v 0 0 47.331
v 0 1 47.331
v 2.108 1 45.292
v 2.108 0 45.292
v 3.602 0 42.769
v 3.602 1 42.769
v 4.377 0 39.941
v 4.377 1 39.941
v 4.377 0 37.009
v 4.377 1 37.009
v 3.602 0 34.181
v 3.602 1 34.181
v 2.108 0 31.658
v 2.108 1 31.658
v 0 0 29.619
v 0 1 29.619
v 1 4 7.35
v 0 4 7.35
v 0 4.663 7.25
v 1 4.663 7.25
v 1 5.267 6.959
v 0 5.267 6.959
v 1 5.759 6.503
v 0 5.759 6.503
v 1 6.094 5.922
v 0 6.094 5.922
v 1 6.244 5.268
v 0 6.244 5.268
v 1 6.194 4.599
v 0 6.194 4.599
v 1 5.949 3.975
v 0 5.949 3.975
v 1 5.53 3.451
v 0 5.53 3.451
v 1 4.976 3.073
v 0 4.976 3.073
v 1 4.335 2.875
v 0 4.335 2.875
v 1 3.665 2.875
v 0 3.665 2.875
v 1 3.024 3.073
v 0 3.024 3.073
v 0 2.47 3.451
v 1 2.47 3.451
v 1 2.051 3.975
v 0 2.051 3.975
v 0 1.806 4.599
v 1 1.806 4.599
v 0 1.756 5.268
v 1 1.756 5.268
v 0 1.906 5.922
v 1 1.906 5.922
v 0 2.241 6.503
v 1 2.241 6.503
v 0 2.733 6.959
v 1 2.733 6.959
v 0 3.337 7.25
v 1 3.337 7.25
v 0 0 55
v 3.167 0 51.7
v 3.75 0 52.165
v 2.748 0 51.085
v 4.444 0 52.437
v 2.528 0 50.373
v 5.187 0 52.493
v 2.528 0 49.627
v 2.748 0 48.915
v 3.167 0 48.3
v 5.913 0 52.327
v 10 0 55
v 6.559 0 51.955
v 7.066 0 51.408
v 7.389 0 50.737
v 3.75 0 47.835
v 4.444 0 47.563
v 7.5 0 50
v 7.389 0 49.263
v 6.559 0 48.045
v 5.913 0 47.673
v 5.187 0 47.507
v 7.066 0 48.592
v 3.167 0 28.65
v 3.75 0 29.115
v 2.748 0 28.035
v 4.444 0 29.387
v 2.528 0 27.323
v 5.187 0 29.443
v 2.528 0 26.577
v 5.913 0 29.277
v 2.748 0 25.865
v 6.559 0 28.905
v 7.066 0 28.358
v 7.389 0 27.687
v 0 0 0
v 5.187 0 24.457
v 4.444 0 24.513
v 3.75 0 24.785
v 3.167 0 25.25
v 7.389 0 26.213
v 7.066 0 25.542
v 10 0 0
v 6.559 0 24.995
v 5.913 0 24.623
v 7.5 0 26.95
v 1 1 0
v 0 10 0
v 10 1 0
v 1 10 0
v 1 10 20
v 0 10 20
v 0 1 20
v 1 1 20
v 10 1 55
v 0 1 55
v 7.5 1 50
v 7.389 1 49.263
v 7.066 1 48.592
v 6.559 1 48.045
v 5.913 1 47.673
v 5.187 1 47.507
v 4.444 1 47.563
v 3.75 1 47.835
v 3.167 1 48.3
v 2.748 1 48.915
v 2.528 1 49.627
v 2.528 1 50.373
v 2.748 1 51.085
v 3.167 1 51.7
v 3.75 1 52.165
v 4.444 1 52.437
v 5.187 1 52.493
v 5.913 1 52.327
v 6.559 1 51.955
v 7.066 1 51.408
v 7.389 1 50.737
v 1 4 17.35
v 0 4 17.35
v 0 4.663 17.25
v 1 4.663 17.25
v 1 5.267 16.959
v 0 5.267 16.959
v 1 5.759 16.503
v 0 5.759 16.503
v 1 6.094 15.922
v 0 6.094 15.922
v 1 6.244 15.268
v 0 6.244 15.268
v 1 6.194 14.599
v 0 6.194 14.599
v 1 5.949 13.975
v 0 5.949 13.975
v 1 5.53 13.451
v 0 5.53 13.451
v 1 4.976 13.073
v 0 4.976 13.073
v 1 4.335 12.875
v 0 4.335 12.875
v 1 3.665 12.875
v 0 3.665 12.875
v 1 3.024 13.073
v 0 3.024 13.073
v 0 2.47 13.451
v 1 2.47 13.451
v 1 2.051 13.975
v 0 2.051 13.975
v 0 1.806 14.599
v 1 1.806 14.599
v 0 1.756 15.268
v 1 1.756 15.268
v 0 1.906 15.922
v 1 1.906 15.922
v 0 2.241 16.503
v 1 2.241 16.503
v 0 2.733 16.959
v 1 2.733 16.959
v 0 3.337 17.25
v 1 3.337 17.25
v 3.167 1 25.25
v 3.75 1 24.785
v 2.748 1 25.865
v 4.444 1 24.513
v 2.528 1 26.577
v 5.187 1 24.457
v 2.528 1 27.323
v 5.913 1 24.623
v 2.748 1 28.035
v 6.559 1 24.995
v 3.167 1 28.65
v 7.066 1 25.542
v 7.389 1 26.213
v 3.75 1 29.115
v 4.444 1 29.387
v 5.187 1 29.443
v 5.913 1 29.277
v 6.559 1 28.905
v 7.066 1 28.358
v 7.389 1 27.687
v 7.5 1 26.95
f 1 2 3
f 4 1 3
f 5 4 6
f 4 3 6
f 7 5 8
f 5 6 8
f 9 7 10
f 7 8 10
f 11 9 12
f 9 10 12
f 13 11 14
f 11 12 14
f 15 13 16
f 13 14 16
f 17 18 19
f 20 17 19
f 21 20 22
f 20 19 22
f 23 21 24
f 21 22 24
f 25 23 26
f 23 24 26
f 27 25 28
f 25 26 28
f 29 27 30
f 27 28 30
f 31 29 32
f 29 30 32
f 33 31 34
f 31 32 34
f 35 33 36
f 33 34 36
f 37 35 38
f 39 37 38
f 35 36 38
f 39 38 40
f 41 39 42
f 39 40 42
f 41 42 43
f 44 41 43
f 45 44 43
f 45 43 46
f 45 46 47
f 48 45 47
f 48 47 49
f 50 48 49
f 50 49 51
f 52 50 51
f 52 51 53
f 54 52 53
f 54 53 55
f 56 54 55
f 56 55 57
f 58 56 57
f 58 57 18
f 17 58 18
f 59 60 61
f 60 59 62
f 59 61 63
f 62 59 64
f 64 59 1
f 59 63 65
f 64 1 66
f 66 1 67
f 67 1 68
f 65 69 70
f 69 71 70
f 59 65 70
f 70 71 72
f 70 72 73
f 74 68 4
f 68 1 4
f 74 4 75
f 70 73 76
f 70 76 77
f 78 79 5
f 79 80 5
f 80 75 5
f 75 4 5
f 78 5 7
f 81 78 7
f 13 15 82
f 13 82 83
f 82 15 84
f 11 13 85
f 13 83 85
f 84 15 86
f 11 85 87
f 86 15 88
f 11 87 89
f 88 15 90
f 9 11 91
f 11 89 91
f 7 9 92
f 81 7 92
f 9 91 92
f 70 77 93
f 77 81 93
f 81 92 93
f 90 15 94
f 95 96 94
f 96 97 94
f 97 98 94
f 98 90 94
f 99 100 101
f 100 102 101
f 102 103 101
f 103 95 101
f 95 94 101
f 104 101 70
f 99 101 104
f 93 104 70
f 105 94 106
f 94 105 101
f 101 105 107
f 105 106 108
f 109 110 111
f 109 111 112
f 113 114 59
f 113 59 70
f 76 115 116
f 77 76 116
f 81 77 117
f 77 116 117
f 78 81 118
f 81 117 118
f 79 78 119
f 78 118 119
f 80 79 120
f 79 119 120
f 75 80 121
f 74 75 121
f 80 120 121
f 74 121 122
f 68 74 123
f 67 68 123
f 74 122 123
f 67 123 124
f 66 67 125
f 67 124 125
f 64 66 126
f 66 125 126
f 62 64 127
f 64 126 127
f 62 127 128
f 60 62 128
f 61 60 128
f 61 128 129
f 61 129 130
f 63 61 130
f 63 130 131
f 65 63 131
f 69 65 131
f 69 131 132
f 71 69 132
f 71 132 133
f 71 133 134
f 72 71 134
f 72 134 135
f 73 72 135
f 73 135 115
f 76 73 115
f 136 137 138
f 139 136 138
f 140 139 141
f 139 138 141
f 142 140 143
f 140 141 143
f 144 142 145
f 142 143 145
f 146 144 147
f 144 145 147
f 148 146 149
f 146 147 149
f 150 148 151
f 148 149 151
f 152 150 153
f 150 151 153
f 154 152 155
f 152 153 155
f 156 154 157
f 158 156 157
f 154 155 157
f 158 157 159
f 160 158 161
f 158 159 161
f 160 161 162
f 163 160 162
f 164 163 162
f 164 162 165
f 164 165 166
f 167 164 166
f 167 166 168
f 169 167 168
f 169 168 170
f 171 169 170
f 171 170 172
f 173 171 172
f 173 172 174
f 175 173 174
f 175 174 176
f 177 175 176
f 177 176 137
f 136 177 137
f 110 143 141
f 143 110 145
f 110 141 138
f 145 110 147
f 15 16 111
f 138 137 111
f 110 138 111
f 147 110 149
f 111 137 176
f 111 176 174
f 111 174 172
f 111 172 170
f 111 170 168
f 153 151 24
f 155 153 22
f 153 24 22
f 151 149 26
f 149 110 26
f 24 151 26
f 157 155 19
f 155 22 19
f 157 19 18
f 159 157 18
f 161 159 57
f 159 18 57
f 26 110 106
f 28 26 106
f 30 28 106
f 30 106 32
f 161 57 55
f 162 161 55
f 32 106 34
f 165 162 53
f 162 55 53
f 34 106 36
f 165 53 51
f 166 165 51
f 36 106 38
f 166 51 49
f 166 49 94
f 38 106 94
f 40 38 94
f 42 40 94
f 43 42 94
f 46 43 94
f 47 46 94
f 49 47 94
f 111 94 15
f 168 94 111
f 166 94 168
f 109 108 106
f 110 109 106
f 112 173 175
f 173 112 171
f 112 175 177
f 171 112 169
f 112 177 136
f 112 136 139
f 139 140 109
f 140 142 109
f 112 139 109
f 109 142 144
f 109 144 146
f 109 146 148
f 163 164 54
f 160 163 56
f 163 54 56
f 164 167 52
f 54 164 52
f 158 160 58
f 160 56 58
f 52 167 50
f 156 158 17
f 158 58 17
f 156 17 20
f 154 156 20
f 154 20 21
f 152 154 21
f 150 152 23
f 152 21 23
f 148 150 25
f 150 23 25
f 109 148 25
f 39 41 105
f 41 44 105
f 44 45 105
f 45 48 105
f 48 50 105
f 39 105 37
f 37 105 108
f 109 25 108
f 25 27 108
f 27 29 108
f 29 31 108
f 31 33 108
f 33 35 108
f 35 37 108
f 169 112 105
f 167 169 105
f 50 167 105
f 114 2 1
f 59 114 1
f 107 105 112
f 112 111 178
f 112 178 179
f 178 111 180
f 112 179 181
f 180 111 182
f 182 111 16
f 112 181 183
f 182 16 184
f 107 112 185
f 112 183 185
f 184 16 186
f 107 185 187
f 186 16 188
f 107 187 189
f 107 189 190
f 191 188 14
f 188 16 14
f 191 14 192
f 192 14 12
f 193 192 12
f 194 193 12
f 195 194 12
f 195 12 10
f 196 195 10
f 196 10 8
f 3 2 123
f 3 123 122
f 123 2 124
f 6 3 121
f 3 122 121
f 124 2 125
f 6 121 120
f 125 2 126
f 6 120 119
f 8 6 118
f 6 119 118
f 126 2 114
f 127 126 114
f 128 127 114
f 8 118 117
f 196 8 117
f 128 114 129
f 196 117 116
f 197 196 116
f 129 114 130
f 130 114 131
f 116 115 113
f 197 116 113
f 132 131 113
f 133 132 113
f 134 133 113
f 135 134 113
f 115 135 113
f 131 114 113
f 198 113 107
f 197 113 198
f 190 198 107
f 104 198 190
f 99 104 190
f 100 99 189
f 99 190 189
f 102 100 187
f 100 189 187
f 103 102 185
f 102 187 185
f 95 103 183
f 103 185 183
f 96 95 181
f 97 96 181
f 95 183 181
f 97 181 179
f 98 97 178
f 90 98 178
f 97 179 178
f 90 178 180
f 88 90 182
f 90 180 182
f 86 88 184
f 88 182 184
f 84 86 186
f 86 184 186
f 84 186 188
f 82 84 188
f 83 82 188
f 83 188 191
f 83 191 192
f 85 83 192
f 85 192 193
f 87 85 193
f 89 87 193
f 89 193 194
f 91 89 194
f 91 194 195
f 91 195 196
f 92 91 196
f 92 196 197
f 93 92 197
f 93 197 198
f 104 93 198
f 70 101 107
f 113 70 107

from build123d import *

# Parameters (mm, degrees)
BOSS_EXTRUDE1_DEPTH = 55
SKETCH2_R           = 2.5
CUT_EXTRUDE1_DEPTH  = 2
SKETCH3_W           = 1
SKETCH3_H           = 9
CUT_EXTRUDE2_DEPTH  = 35
SKETCH4_R           = 2.25
CUT_EXTRUDE3_DEPTH  = 11


with BuildPart() as part:
    # Sketch1 → Boss-Extrude1 (new body)
    with BuildSketch(Plane.XY):
        Polygon((0, 10), (0, 0), (10, 0), (10, 1), (1, 1), (1, 10), align=None)
    extrude(amount=BOSS_EXTRUDE1_DEPTH)

    # Sketch2 → Cut-Extrude1 (cut, through all)
    with BuildSketch(Plane(origin=(0, 1, 0), x_dir=(1, 0, 0), z_dir=(0, 1, 0))):
        with Locations((5, -50)):
            Circle(SKETCH2_R)
        with Locations((5, -26.95)):
            Circle(SKETCH2_R)
        with BuildLine():
            Line((-2.7555139, -28.141028133), (-2.7555139, -48.808971867))
            ThreePointArc((-2.7555139, -48.808971867), (4.475, -38.475), (-2.7555139, -28.141028133))
        make_face()
    extrude(amount=-CUT_EXTRUDE1_DEPTH, mode=Mode.SUBTRACT)

    # Sketch3 → Cut-Extrude2 (cut)
    with BuildSketch(Plane.XY.offset(55)):
        with Locations((0.5, 5.5)):
            Rectangle(SKETCH3_W, SKETCH3_H)
    extrude(amount=-CUT_EXTRUDE2_DEPTH, mode=Mode.SUBTRACT)

    # Sketch4 → Cut-Extrude3 (cut, through all)
    with BuildSketch(Plane.ZY):
        with Locations((5.1, 4)):
            Circle(SKETCH4_R)
        with Locations((15.1, 4)):
            Circle(SKETCH4_R)
    extrude(amount=-CUT_EXTRUDE3_DEPTH, mode=Mode.SUBTRACT)


solid = part.part
